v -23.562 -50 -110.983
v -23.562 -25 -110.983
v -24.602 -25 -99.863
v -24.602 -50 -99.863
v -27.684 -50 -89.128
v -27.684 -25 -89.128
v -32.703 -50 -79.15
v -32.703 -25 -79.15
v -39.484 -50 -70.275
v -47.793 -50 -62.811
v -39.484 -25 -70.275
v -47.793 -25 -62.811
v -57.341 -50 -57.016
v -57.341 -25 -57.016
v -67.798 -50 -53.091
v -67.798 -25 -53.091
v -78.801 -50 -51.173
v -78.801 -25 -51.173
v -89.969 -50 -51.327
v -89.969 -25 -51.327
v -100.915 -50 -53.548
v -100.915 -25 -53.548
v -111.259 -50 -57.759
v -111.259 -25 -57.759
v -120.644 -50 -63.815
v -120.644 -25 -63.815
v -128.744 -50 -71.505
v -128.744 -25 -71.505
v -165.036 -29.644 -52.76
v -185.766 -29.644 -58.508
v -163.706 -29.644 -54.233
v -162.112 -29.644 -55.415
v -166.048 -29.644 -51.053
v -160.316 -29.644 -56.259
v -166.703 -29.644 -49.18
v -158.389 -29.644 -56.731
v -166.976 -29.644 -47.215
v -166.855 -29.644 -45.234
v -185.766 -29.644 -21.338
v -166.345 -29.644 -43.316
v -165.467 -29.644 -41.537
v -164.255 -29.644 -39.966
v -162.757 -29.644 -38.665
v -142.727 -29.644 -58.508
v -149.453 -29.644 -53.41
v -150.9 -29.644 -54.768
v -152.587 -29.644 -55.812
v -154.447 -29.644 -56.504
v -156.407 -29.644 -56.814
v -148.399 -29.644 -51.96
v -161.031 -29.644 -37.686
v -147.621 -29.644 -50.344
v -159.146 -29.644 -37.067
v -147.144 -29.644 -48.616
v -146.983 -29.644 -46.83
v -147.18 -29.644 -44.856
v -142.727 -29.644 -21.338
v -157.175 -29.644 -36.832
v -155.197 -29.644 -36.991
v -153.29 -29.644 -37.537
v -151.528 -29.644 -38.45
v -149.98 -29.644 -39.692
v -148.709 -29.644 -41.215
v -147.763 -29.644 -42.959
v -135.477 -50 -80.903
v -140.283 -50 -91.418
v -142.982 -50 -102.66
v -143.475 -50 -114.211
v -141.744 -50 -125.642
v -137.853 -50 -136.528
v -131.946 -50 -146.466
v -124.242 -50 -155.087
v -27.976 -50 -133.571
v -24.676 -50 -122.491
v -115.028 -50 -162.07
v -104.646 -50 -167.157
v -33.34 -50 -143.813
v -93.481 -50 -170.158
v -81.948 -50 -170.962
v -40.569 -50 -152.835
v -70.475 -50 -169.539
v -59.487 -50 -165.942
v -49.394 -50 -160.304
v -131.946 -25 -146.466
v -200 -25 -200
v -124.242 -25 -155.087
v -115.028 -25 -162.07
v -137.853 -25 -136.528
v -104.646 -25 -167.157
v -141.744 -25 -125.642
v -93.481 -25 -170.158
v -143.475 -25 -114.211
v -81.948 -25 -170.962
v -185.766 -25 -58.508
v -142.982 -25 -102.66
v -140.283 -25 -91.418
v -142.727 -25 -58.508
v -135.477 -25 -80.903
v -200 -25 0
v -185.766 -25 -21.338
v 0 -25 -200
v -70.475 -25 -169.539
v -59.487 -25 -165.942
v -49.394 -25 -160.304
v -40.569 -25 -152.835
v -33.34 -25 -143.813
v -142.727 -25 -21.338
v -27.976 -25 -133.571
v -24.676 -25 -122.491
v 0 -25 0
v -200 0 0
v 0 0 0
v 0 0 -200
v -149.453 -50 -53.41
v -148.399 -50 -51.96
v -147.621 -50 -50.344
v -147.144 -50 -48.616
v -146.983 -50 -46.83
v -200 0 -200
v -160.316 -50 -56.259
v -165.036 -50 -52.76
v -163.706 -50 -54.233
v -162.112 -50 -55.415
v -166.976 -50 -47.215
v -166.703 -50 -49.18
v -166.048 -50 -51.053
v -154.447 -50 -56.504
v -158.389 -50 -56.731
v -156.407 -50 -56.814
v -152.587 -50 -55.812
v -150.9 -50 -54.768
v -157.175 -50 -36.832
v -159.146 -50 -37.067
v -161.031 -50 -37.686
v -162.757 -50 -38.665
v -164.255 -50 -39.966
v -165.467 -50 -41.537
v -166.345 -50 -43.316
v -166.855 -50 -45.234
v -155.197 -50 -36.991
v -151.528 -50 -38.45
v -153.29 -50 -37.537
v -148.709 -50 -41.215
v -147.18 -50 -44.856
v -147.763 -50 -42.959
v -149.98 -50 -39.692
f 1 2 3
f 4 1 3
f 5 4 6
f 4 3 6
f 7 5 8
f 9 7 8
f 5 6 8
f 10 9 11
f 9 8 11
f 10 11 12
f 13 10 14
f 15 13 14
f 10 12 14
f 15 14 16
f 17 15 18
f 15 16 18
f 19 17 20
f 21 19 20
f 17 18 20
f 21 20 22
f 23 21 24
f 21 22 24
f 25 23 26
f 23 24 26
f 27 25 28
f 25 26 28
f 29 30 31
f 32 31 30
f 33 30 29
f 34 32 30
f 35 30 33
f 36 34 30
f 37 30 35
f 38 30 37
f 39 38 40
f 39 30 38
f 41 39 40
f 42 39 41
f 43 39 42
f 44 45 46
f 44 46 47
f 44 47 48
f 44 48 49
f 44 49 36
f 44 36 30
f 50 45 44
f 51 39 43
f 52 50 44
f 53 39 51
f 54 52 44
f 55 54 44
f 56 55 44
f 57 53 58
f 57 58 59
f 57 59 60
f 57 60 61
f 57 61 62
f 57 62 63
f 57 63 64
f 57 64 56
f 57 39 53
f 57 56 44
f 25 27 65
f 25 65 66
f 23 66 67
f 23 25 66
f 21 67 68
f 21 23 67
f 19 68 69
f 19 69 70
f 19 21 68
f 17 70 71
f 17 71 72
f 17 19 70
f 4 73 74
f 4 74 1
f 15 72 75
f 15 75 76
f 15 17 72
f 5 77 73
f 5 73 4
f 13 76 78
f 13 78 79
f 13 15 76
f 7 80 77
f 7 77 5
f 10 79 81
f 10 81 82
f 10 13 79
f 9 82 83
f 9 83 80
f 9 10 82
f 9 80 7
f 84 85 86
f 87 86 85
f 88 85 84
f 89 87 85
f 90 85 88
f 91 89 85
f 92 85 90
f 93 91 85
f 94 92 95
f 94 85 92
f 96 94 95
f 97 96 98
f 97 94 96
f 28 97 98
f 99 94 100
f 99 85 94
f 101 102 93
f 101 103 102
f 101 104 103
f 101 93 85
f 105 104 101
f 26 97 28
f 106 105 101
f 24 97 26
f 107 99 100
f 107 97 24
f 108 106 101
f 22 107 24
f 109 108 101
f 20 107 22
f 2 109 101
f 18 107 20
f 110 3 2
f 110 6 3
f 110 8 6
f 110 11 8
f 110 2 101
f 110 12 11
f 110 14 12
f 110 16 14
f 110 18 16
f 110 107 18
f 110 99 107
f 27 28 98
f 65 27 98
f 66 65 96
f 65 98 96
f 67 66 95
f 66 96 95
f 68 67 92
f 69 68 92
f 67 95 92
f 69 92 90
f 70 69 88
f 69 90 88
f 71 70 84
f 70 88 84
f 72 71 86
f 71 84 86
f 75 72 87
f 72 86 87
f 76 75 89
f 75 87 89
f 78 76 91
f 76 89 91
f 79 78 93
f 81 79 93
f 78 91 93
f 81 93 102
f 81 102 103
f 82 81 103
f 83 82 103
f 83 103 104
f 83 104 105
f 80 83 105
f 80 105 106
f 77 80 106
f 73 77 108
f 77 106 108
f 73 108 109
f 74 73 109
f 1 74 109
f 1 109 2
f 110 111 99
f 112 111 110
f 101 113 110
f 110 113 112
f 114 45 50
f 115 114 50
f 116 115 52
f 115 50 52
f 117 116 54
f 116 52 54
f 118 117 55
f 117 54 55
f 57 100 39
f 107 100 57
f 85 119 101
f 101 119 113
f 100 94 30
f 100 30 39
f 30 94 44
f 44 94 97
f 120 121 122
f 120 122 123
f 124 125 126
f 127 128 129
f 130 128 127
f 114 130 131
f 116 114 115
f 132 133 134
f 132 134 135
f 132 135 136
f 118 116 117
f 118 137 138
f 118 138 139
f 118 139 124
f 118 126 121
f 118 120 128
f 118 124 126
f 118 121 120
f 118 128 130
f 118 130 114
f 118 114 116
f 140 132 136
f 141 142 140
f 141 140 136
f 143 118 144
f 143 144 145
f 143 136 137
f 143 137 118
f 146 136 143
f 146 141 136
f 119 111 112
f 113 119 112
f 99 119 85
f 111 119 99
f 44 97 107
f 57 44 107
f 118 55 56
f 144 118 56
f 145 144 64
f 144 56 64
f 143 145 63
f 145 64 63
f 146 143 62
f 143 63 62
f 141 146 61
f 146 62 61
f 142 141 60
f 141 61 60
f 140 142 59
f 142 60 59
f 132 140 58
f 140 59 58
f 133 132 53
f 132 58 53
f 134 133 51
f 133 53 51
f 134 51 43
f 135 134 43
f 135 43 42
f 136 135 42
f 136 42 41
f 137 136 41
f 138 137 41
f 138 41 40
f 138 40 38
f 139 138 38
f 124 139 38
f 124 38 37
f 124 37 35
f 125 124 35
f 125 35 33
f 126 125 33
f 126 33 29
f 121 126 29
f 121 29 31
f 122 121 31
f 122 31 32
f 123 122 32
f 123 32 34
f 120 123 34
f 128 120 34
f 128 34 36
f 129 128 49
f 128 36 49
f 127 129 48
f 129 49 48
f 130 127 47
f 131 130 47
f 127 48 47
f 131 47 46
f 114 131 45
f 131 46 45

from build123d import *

# Parameters (mm, degrees)
F0_W     = 200
F0_H     = 200
F1_DEPTH = 25
F3_DEPTH = 25
F4_W     = 43.039545
F4_H     = 37.170328
F5_DEPTH = 4.644


with BuildPart() as f1:
    # F0 (on Front) → F1 (new body)
    with BuildSketch(Plane.XZ):
        with Locations((-100, -100)):
            Rectangle(F0_W, F0_H)
    extrude(amount=F1_DEPTH)

    # F2 (on face) → F3 (join)
    with BuildSketch(Plane.XZ.offset(25)):
        with BuildLine():
            ThreePointArc((-149.452707, -53.410247), (-147.62081, -50.344453), (-146.983063, -46.830449))
            ThreePointArc((-146.983063, -46.830449), (-166.345315, -43.316446), (-149.452707, -53.410247))
        make_face()
        with BuildLine():
            ThreePointArc((-23.562095, -110.983481), (-62.478073, -54.809964), (-128.744229, -71.504692))
            ThreePointArc((-128.744229, -71.504692), (-104.646117, -167.156998), (-23.562095, -110.983481))
        make_face()
    extrude(amount=F3_DEPTH)

    # F4 (on face) → F5 (join)
    with BuildSketch(Plane.XZ.offset(25)):
        with Locations((-164.246566, -39.92312)):
            Rectangle(F4_W, F4_H)
    extrude(amount=F5_DEPTH)


solid = f1.part
